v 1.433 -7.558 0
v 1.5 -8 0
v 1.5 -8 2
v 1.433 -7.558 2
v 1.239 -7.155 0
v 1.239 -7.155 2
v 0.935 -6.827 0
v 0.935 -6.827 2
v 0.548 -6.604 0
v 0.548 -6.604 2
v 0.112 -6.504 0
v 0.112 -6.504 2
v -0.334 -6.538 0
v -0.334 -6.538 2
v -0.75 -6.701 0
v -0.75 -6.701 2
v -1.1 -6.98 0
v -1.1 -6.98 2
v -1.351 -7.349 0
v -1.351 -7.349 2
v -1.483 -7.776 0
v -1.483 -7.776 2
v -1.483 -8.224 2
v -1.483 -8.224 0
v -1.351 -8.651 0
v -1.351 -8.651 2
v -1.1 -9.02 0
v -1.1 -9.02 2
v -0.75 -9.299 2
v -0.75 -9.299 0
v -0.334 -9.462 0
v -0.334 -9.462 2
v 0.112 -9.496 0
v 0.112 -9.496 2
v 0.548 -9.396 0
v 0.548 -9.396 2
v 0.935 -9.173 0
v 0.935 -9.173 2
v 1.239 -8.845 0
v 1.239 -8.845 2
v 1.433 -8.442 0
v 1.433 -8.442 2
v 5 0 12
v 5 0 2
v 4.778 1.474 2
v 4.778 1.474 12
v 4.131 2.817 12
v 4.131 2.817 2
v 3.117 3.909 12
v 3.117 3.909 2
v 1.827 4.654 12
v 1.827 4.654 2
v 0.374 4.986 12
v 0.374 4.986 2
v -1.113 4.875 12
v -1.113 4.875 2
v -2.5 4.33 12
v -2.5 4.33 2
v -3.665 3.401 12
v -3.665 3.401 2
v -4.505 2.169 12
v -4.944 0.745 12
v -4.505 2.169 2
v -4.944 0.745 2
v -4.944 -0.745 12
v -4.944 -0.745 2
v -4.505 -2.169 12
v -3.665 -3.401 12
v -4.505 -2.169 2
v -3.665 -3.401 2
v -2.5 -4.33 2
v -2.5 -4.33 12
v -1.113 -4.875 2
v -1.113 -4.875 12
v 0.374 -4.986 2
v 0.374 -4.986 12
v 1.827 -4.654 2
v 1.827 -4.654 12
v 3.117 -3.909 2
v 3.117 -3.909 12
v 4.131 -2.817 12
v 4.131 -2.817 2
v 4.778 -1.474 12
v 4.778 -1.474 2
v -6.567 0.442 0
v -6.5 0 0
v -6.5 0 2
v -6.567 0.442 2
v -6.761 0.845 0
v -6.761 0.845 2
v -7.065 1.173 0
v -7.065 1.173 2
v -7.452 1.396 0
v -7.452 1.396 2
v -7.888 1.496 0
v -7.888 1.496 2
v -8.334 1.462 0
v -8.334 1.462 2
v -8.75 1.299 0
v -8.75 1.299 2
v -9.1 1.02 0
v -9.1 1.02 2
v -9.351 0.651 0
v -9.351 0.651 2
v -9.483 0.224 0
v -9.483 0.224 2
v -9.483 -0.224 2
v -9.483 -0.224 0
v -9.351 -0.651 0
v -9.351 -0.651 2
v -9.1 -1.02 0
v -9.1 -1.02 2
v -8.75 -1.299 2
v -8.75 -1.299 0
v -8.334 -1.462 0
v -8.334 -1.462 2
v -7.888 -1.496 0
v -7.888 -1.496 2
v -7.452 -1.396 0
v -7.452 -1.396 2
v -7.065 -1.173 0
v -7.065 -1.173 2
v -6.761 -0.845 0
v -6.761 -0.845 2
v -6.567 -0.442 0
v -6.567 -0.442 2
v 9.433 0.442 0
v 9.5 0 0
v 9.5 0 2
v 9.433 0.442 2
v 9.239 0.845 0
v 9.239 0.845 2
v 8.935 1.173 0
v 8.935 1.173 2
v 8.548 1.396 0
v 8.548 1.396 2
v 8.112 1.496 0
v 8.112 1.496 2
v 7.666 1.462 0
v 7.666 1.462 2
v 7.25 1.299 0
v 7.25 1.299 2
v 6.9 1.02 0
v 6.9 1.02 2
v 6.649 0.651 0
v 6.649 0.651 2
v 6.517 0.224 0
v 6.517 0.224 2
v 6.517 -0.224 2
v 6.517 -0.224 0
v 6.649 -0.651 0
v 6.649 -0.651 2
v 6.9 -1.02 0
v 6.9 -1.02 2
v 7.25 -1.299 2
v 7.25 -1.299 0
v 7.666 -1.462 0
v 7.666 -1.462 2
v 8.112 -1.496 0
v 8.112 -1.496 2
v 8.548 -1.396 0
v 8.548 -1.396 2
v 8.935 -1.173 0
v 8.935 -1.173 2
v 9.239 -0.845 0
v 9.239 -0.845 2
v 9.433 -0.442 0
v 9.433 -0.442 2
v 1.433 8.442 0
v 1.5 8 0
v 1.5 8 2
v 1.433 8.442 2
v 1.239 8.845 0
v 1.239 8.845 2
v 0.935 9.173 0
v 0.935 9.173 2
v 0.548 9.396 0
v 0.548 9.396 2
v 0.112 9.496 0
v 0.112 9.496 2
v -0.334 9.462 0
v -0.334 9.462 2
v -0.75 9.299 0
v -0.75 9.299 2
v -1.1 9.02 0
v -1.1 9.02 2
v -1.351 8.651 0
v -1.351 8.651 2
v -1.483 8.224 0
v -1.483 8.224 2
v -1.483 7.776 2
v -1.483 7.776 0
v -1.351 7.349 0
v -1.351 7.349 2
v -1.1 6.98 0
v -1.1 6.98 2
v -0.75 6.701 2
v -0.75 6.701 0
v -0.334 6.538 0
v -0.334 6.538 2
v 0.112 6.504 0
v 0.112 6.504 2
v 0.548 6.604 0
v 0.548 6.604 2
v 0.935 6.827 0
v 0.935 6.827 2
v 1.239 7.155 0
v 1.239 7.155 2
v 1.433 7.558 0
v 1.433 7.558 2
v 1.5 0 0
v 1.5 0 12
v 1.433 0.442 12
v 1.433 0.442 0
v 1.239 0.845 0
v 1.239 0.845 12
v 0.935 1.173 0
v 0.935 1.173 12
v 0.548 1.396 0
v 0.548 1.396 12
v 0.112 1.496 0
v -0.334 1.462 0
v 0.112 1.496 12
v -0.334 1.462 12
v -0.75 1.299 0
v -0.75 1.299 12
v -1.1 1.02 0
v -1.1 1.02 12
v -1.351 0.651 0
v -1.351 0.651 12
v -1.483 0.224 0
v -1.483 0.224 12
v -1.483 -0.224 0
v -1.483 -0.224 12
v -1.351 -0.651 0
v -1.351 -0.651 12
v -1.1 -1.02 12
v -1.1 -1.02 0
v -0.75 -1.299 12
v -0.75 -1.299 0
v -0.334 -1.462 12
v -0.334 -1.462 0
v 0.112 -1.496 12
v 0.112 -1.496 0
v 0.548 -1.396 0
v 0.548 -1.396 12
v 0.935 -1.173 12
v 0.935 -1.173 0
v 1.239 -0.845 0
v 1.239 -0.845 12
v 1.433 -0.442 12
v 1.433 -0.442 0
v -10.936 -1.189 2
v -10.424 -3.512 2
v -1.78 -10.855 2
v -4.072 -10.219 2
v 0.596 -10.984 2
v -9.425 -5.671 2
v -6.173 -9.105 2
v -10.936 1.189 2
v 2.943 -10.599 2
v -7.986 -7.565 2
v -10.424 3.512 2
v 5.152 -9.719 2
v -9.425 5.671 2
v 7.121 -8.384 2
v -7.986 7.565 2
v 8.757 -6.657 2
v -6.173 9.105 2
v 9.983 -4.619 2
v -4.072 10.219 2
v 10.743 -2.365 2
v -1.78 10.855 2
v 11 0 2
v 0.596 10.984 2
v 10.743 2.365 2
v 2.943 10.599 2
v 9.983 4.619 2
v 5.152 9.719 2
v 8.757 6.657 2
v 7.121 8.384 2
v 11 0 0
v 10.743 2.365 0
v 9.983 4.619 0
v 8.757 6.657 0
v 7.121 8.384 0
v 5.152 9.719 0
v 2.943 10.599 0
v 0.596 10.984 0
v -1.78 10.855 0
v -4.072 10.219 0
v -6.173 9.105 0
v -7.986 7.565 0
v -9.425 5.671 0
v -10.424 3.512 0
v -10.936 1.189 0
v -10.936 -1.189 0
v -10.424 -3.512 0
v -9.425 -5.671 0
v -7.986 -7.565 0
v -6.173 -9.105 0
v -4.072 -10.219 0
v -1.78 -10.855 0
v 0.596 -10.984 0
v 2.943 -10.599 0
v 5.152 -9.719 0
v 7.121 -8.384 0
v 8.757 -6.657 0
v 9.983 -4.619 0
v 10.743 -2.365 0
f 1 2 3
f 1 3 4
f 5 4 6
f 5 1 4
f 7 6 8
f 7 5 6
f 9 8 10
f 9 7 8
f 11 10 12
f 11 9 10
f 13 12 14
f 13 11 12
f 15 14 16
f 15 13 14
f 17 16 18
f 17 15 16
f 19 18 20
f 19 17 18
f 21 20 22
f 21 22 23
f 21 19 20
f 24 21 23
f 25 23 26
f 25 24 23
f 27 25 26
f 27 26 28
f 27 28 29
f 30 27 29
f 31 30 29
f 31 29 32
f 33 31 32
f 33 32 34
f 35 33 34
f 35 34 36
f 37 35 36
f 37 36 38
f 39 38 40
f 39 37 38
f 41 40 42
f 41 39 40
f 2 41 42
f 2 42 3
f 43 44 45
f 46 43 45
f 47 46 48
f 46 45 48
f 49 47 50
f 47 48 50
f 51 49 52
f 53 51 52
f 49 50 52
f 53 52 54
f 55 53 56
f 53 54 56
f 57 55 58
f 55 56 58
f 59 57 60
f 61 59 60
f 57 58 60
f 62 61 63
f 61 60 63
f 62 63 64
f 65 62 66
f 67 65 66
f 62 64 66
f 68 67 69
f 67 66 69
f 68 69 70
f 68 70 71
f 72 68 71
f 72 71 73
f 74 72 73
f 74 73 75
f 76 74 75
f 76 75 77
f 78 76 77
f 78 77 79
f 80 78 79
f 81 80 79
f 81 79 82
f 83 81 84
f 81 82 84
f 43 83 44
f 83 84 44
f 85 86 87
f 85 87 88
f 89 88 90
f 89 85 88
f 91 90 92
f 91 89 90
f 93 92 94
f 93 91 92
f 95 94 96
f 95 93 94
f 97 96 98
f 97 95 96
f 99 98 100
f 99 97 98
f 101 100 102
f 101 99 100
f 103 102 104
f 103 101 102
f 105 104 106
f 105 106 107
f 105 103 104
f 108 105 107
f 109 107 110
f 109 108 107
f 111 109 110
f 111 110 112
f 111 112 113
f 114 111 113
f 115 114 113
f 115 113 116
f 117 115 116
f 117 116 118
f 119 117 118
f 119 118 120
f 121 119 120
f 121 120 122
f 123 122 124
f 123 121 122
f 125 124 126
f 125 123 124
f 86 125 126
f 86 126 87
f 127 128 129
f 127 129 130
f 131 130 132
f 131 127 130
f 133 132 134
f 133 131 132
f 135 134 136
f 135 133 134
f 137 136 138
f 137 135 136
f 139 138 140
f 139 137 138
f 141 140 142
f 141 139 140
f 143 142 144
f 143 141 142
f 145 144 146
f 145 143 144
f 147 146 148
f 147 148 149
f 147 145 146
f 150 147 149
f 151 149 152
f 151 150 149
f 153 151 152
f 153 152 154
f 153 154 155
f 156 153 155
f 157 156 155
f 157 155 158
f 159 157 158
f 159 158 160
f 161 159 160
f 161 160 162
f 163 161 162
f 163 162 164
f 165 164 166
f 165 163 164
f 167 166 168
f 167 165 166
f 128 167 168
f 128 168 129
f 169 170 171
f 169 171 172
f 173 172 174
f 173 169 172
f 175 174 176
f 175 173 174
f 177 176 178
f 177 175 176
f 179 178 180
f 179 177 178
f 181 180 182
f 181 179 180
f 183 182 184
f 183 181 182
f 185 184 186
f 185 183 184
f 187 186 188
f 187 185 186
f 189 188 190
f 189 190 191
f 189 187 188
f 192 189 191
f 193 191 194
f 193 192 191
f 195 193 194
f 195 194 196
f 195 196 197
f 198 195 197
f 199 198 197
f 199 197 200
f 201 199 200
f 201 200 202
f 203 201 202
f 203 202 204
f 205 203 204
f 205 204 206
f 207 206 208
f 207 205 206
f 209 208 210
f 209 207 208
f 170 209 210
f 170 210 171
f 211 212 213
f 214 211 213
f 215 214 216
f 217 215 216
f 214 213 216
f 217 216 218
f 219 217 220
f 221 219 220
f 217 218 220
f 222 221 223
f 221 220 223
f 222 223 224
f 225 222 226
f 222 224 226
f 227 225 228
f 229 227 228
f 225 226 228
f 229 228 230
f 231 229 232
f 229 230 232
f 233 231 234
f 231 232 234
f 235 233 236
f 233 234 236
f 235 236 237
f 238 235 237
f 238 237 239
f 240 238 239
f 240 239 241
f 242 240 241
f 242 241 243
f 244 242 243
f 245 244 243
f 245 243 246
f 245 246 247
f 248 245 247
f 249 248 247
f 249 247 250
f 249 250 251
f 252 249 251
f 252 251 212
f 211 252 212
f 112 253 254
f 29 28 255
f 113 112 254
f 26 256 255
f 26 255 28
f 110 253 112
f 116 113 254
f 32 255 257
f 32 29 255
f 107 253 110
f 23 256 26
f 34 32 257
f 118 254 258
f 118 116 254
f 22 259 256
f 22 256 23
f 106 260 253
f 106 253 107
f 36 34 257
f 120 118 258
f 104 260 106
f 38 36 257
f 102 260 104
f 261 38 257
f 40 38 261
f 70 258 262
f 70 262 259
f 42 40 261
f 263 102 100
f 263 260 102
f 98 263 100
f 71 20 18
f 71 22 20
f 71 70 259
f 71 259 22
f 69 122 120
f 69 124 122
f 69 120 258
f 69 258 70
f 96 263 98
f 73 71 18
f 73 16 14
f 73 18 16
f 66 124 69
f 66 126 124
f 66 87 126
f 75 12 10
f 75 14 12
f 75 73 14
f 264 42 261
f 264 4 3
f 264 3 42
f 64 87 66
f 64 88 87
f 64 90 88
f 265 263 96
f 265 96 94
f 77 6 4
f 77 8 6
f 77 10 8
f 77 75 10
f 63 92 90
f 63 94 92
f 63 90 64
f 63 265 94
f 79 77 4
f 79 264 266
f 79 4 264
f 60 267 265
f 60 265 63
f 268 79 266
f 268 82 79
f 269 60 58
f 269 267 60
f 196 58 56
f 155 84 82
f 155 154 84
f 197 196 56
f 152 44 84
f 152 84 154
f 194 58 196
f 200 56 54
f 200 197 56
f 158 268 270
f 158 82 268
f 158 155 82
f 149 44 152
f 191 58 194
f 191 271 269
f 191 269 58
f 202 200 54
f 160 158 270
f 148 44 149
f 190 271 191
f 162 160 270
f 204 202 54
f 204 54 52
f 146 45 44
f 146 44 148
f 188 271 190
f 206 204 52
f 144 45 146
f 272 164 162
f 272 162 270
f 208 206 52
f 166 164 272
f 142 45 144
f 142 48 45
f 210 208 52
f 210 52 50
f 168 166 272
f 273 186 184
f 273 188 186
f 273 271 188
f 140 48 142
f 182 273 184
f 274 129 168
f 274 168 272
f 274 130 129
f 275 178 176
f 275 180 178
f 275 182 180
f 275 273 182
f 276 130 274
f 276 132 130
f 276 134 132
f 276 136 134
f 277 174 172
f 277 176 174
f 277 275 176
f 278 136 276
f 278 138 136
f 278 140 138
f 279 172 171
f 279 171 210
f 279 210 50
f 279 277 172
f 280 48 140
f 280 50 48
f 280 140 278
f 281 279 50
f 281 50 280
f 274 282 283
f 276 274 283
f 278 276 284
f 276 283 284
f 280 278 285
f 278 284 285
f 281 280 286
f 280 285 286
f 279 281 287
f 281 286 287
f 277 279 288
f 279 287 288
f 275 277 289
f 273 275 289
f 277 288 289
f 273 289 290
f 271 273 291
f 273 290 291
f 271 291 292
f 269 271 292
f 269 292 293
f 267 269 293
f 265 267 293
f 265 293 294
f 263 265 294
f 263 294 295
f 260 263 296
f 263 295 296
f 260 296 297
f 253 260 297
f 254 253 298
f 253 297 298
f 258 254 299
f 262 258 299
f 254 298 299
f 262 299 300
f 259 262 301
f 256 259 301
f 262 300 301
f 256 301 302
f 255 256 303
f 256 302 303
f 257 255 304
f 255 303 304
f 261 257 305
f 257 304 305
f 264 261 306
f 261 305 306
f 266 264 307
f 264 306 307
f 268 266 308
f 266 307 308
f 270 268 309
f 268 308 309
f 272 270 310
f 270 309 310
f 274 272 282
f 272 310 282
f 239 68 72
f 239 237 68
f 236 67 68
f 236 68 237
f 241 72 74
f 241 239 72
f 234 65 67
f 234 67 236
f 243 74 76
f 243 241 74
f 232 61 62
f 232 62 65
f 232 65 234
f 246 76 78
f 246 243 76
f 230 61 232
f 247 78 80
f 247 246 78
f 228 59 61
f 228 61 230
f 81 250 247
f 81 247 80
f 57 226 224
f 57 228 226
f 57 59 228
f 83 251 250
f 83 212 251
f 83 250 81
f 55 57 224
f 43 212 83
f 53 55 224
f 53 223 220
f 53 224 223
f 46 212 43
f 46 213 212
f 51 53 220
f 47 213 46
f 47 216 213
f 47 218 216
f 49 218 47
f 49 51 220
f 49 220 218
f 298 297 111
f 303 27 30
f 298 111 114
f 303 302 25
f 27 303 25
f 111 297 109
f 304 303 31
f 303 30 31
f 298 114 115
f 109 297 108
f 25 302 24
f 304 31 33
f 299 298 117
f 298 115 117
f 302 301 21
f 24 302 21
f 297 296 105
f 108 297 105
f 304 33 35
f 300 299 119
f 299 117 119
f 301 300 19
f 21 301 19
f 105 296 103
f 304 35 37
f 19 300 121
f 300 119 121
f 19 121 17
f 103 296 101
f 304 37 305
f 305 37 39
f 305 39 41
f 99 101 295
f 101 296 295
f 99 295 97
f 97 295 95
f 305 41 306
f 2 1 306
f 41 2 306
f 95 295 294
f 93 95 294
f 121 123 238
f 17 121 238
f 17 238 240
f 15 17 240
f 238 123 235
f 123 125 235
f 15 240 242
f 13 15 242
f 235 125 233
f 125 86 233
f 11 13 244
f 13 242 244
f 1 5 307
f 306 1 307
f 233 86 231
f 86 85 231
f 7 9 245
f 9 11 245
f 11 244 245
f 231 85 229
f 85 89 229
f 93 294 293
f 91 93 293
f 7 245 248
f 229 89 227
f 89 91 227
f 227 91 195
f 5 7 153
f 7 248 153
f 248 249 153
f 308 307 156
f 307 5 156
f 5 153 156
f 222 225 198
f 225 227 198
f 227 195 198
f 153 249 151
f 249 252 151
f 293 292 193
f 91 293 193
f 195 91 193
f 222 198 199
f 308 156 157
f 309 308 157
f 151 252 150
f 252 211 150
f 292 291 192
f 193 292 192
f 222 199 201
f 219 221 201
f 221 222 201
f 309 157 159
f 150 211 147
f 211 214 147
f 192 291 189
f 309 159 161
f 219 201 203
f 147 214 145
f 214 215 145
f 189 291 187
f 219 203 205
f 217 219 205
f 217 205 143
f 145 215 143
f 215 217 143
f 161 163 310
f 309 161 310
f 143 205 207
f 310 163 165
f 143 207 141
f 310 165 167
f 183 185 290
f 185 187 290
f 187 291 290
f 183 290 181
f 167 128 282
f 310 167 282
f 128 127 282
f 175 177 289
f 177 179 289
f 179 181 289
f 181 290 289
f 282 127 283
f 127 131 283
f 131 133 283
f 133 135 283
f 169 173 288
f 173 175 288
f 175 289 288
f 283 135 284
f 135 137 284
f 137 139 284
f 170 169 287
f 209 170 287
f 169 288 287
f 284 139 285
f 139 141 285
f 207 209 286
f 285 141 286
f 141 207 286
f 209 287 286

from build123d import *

# Parameters (mm, degrees)
SKETCH_1_R          = 11
SKETCH_1_R_2        = 1.5
EXTRUDE_1_DEPTH     = 2
SKETCH_4_R          = 5
EXTRUDE_3_DEPTH     = 10
SKETCH_5_R          = 1.5
CUT_EXTRUDE_2_DEPTH = 20.646882704


with BuildPart() as part:
    # 草图1 → 凸台-拉伸1 (new body)
    with BuildSketch(Plane.XY):
        Circle(SKETCH_1_R)
        with Locations((0, 8)):
            Circle(SKETCH_1_R_2, mode=Mode.SUBTRACT)
        with Locations((8, 0)):
            Circle(SKETCH_1_R_2, mode=Mode.SUBTRACT)
        with Locations((0, -8)):
            Circle(SKETCH_1_R_2, mode=Mode.SUBTRACT)
        with Locations((-8, 0)):
            Circle(SKETCH_1_R_2, mode=Mode.SUBTRACT)
    extrude(amount=EXTRUDE_1_DEPTH)

    # 草图4 → 凸台-拉伸3 (add)
    with BuildSketch(Plane.XY.offset(2)):
        Circle(SKETCH_4_R)
    extrude(amount=EXTRUDE_3_DEPTH)

    # 草图5 → 切除-拉伸2 (cut, through all)
    with BuildSketch(Plane.XY.offset(12)):
        Circle(SKETCH_5_R)
    extrude(amount=-CUT_EXTRUDE_2_DEPTH, mode=Mode.SUBTRACT)


solid = part.part
